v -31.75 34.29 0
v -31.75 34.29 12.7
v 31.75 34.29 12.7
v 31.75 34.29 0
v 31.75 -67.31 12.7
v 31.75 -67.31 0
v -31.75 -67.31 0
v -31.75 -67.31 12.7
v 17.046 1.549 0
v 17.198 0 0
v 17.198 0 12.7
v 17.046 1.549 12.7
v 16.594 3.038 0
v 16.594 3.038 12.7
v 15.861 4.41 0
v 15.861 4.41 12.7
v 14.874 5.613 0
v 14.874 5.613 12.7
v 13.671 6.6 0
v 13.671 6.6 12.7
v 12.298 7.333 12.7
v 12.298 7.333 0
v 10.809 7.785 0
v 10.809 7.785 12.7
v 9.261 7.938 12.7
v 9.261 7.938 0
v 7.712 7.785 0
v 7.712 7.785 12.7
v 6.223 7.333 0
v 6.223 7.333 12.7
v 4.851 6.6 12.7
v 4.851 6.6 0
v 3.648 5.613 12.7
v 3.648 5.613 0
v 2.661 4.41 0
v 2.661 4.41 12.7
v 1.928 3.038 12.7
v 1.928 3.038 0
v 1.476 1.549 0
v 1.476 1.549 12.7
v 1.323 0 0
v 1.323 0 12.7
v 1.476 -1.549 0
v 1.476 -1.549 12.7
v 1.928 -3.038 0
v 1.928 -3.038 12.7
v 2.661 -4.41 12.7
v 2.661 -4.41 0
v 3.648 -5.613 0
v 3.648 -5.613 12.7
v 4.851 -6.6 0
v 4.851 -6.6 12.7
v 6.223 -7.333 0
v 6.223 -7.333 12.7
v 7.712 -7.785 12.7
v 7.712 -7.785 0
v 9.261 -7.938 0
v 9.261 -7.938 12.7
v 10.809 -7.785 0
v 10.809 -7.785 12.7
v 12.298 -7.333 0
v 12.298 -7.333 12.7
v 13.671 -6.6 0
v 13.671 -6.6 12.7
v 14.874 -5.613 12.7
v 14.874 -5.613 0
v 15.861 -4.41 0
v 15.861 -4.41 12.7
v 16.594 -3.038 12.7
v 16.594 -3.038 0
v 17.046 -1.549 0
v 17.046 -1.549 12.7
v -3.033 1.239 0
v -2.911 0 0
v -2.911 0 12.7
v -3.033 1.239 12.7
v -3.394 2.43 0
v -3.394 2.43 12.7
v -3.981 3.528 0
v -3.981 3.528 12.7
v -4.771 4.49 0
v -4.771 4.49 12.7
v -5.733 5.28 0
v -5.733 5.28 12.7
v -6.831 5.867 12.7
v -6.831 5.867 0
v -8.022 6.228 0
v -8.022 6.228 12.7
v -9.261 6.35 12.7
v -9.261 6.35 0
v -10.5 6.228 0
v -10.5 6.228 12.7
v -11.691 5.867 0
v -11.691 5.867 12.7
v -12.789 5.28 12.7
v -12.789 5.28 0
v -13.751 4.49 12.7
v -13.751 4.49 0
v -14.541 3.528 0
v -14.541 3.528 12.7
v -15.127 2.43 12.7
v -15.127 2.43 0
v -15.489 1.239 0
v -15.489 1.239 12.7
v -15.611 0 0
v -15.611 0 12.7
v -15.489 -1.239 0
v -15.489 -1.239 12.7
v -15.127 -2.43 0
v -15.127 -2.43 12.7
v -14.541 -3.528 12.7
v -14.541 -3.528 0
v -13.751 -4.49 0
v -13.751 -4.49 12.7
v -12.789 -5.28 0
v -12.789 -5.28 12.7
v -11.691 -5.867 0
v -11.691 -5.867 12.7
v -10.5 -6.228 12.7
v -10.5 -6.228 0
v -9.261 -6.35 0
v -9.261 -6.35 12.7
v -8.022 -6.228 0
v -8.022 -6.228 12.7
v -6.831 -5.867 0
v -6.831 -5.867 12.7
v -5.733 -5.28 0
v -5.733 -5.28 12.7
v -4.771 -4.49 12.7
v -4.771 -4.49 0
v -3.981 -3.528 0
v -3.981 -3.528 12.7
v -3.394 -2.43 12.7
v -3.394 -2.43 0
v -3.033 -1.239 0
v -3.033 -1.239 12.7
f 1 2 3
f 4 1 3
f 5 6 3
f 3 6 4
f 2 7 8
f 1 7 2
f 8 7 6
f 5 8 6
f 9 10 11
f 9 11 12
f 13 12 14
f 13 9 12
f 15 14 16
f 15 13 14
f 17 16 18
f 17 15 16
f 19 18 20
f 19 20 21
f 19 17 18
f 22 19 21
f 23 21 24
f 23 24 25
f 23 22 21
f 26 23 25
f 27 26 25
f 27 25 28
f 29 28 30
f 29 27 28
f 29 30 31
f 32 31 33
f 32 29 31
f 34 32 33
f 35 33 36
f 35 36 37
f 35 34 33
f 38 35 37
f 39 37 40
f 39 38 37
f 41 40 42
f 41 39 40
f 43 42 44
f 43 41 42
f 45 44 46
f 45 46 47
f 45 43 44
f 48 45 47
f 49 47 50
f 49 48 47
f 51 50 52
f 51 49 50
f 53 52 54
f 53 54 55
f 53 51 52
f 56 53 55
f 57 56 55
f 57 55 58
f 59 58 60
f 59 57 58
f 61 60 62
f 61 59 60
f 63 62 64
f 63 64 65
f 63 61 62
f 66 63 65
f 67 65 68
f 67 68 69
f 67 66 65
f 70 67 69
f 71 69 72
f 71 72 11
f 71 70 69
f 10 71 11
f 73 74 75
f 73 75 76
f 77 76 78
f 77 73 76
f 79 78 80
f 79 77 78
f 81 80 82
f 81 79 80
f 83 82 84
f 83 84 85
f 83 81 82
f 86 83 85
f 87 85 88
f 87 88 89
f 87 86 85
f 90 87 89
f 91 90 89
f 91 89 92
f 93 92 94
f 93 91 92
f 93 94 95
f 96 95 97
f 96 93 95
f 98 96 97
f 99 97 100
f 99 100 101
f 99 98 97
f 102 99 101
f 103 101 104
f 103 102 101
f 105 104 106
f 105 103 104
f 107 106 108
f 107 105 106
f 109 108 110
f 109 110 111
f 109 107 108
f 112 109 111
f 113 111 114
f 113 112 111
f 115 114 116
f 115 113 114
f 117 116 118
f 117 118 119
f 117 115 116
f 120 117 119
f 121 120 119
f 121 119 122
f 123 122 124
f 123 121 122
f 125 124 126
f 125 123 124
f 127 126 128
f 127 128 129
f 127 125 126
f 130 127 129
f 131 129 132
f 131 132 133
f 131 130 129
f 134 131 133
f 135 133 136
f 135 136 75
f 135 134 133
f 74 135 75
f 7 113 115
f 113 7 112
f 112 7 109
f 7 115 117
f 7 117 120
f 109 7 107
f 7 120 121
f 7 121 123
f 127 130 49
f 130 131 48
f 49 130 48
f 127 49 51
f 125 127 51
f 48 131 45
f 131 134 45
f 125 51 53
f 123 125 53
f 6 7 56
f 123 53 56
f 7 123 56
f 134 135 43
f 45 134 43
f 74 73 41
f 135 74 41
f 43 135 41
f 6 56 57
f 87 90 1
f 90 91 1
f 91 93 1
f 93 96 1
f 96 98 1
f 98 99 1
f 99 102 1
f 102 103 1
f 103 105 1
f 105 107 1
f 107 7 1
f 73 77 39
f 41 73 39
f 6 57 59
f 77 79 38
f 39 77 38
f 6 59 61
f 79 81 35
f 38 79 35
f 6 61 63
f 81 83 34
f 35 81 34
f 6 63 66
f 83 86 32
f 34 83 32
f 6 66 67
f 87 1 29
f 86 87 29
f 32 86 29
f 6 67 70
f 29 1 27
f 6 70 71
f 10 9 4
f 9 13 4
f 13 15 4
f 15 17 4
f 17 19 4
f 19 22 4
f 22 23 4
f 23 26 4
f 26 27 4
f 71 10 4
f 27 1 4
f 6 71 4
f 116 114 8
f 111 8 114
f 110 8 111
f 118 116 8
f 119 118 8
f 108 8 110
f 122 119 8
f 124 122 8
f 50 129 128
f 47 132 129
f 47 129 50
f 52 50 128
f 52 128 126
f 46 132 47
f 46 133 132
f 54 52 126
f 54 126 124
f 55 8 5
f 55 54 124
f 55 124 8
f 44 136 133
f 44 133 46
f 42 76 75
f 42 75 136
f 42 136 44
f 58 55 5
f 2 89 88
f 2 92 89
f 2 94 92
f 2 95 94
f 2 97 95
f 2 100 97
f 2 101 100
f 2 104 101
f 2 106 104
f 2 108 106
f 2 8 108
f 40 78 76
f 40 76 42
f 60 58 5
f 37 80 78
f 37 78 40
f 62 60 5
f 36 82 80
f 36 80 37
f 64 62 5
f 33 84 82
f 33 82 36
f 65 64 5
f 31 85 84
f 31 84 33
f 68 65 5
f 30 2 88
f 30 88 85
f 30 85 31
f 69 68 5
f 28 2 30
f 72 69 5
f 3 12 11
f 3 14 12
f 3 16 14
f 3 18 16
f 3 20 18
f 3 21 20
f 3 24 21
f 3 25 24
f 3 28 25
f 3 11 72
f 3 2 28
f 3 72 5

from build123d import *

# Parameters (mm, degrees)
SKETCH1_W           = 63.5
SKETCH1_H           = 134.62
SKETCH1_R           = 6.35
SKETCH1_R_2         = 7.9375
BOSS_EXTRUDE1_DEPTH = 12.7
SKETCH2_W           = 63.5
SKETCH2_H           = 33.02
CUT_EXTRUDE1_DEPTH  = 76.498268854


with BuildPart() as part:
    # Sketch1 → Boss-Extrude1 (new body)
    with BuildSketch(Plane.XY):
        Rectangle(SKETCH1_W, SKETCH1_H)
        with Locations((-9.26084, 0)):
            Circle(SKETCH1_R, mode=Mode.SUBTRACT)
        with Locations((9.26084, 0)):
            Circle(SKETCH1_R_2, mode=Mode.SUBTRACT)
    extrude(amount=BOSS_EXTRUDE1_DEPTH)

    # Sketch2 → Cut-Extrude1 (cut, through all)
    with BuildSketch(Plane.XY.offset(12.7)):
        with Locations((0, 50.8)):
            Rectangle(SKETCH2_W, SKETCH2_H)
    extrude(amount=-CUT_EXTRUDE1_DEPTH, mode=Mode.SUBTRACT)


solid = part.part
